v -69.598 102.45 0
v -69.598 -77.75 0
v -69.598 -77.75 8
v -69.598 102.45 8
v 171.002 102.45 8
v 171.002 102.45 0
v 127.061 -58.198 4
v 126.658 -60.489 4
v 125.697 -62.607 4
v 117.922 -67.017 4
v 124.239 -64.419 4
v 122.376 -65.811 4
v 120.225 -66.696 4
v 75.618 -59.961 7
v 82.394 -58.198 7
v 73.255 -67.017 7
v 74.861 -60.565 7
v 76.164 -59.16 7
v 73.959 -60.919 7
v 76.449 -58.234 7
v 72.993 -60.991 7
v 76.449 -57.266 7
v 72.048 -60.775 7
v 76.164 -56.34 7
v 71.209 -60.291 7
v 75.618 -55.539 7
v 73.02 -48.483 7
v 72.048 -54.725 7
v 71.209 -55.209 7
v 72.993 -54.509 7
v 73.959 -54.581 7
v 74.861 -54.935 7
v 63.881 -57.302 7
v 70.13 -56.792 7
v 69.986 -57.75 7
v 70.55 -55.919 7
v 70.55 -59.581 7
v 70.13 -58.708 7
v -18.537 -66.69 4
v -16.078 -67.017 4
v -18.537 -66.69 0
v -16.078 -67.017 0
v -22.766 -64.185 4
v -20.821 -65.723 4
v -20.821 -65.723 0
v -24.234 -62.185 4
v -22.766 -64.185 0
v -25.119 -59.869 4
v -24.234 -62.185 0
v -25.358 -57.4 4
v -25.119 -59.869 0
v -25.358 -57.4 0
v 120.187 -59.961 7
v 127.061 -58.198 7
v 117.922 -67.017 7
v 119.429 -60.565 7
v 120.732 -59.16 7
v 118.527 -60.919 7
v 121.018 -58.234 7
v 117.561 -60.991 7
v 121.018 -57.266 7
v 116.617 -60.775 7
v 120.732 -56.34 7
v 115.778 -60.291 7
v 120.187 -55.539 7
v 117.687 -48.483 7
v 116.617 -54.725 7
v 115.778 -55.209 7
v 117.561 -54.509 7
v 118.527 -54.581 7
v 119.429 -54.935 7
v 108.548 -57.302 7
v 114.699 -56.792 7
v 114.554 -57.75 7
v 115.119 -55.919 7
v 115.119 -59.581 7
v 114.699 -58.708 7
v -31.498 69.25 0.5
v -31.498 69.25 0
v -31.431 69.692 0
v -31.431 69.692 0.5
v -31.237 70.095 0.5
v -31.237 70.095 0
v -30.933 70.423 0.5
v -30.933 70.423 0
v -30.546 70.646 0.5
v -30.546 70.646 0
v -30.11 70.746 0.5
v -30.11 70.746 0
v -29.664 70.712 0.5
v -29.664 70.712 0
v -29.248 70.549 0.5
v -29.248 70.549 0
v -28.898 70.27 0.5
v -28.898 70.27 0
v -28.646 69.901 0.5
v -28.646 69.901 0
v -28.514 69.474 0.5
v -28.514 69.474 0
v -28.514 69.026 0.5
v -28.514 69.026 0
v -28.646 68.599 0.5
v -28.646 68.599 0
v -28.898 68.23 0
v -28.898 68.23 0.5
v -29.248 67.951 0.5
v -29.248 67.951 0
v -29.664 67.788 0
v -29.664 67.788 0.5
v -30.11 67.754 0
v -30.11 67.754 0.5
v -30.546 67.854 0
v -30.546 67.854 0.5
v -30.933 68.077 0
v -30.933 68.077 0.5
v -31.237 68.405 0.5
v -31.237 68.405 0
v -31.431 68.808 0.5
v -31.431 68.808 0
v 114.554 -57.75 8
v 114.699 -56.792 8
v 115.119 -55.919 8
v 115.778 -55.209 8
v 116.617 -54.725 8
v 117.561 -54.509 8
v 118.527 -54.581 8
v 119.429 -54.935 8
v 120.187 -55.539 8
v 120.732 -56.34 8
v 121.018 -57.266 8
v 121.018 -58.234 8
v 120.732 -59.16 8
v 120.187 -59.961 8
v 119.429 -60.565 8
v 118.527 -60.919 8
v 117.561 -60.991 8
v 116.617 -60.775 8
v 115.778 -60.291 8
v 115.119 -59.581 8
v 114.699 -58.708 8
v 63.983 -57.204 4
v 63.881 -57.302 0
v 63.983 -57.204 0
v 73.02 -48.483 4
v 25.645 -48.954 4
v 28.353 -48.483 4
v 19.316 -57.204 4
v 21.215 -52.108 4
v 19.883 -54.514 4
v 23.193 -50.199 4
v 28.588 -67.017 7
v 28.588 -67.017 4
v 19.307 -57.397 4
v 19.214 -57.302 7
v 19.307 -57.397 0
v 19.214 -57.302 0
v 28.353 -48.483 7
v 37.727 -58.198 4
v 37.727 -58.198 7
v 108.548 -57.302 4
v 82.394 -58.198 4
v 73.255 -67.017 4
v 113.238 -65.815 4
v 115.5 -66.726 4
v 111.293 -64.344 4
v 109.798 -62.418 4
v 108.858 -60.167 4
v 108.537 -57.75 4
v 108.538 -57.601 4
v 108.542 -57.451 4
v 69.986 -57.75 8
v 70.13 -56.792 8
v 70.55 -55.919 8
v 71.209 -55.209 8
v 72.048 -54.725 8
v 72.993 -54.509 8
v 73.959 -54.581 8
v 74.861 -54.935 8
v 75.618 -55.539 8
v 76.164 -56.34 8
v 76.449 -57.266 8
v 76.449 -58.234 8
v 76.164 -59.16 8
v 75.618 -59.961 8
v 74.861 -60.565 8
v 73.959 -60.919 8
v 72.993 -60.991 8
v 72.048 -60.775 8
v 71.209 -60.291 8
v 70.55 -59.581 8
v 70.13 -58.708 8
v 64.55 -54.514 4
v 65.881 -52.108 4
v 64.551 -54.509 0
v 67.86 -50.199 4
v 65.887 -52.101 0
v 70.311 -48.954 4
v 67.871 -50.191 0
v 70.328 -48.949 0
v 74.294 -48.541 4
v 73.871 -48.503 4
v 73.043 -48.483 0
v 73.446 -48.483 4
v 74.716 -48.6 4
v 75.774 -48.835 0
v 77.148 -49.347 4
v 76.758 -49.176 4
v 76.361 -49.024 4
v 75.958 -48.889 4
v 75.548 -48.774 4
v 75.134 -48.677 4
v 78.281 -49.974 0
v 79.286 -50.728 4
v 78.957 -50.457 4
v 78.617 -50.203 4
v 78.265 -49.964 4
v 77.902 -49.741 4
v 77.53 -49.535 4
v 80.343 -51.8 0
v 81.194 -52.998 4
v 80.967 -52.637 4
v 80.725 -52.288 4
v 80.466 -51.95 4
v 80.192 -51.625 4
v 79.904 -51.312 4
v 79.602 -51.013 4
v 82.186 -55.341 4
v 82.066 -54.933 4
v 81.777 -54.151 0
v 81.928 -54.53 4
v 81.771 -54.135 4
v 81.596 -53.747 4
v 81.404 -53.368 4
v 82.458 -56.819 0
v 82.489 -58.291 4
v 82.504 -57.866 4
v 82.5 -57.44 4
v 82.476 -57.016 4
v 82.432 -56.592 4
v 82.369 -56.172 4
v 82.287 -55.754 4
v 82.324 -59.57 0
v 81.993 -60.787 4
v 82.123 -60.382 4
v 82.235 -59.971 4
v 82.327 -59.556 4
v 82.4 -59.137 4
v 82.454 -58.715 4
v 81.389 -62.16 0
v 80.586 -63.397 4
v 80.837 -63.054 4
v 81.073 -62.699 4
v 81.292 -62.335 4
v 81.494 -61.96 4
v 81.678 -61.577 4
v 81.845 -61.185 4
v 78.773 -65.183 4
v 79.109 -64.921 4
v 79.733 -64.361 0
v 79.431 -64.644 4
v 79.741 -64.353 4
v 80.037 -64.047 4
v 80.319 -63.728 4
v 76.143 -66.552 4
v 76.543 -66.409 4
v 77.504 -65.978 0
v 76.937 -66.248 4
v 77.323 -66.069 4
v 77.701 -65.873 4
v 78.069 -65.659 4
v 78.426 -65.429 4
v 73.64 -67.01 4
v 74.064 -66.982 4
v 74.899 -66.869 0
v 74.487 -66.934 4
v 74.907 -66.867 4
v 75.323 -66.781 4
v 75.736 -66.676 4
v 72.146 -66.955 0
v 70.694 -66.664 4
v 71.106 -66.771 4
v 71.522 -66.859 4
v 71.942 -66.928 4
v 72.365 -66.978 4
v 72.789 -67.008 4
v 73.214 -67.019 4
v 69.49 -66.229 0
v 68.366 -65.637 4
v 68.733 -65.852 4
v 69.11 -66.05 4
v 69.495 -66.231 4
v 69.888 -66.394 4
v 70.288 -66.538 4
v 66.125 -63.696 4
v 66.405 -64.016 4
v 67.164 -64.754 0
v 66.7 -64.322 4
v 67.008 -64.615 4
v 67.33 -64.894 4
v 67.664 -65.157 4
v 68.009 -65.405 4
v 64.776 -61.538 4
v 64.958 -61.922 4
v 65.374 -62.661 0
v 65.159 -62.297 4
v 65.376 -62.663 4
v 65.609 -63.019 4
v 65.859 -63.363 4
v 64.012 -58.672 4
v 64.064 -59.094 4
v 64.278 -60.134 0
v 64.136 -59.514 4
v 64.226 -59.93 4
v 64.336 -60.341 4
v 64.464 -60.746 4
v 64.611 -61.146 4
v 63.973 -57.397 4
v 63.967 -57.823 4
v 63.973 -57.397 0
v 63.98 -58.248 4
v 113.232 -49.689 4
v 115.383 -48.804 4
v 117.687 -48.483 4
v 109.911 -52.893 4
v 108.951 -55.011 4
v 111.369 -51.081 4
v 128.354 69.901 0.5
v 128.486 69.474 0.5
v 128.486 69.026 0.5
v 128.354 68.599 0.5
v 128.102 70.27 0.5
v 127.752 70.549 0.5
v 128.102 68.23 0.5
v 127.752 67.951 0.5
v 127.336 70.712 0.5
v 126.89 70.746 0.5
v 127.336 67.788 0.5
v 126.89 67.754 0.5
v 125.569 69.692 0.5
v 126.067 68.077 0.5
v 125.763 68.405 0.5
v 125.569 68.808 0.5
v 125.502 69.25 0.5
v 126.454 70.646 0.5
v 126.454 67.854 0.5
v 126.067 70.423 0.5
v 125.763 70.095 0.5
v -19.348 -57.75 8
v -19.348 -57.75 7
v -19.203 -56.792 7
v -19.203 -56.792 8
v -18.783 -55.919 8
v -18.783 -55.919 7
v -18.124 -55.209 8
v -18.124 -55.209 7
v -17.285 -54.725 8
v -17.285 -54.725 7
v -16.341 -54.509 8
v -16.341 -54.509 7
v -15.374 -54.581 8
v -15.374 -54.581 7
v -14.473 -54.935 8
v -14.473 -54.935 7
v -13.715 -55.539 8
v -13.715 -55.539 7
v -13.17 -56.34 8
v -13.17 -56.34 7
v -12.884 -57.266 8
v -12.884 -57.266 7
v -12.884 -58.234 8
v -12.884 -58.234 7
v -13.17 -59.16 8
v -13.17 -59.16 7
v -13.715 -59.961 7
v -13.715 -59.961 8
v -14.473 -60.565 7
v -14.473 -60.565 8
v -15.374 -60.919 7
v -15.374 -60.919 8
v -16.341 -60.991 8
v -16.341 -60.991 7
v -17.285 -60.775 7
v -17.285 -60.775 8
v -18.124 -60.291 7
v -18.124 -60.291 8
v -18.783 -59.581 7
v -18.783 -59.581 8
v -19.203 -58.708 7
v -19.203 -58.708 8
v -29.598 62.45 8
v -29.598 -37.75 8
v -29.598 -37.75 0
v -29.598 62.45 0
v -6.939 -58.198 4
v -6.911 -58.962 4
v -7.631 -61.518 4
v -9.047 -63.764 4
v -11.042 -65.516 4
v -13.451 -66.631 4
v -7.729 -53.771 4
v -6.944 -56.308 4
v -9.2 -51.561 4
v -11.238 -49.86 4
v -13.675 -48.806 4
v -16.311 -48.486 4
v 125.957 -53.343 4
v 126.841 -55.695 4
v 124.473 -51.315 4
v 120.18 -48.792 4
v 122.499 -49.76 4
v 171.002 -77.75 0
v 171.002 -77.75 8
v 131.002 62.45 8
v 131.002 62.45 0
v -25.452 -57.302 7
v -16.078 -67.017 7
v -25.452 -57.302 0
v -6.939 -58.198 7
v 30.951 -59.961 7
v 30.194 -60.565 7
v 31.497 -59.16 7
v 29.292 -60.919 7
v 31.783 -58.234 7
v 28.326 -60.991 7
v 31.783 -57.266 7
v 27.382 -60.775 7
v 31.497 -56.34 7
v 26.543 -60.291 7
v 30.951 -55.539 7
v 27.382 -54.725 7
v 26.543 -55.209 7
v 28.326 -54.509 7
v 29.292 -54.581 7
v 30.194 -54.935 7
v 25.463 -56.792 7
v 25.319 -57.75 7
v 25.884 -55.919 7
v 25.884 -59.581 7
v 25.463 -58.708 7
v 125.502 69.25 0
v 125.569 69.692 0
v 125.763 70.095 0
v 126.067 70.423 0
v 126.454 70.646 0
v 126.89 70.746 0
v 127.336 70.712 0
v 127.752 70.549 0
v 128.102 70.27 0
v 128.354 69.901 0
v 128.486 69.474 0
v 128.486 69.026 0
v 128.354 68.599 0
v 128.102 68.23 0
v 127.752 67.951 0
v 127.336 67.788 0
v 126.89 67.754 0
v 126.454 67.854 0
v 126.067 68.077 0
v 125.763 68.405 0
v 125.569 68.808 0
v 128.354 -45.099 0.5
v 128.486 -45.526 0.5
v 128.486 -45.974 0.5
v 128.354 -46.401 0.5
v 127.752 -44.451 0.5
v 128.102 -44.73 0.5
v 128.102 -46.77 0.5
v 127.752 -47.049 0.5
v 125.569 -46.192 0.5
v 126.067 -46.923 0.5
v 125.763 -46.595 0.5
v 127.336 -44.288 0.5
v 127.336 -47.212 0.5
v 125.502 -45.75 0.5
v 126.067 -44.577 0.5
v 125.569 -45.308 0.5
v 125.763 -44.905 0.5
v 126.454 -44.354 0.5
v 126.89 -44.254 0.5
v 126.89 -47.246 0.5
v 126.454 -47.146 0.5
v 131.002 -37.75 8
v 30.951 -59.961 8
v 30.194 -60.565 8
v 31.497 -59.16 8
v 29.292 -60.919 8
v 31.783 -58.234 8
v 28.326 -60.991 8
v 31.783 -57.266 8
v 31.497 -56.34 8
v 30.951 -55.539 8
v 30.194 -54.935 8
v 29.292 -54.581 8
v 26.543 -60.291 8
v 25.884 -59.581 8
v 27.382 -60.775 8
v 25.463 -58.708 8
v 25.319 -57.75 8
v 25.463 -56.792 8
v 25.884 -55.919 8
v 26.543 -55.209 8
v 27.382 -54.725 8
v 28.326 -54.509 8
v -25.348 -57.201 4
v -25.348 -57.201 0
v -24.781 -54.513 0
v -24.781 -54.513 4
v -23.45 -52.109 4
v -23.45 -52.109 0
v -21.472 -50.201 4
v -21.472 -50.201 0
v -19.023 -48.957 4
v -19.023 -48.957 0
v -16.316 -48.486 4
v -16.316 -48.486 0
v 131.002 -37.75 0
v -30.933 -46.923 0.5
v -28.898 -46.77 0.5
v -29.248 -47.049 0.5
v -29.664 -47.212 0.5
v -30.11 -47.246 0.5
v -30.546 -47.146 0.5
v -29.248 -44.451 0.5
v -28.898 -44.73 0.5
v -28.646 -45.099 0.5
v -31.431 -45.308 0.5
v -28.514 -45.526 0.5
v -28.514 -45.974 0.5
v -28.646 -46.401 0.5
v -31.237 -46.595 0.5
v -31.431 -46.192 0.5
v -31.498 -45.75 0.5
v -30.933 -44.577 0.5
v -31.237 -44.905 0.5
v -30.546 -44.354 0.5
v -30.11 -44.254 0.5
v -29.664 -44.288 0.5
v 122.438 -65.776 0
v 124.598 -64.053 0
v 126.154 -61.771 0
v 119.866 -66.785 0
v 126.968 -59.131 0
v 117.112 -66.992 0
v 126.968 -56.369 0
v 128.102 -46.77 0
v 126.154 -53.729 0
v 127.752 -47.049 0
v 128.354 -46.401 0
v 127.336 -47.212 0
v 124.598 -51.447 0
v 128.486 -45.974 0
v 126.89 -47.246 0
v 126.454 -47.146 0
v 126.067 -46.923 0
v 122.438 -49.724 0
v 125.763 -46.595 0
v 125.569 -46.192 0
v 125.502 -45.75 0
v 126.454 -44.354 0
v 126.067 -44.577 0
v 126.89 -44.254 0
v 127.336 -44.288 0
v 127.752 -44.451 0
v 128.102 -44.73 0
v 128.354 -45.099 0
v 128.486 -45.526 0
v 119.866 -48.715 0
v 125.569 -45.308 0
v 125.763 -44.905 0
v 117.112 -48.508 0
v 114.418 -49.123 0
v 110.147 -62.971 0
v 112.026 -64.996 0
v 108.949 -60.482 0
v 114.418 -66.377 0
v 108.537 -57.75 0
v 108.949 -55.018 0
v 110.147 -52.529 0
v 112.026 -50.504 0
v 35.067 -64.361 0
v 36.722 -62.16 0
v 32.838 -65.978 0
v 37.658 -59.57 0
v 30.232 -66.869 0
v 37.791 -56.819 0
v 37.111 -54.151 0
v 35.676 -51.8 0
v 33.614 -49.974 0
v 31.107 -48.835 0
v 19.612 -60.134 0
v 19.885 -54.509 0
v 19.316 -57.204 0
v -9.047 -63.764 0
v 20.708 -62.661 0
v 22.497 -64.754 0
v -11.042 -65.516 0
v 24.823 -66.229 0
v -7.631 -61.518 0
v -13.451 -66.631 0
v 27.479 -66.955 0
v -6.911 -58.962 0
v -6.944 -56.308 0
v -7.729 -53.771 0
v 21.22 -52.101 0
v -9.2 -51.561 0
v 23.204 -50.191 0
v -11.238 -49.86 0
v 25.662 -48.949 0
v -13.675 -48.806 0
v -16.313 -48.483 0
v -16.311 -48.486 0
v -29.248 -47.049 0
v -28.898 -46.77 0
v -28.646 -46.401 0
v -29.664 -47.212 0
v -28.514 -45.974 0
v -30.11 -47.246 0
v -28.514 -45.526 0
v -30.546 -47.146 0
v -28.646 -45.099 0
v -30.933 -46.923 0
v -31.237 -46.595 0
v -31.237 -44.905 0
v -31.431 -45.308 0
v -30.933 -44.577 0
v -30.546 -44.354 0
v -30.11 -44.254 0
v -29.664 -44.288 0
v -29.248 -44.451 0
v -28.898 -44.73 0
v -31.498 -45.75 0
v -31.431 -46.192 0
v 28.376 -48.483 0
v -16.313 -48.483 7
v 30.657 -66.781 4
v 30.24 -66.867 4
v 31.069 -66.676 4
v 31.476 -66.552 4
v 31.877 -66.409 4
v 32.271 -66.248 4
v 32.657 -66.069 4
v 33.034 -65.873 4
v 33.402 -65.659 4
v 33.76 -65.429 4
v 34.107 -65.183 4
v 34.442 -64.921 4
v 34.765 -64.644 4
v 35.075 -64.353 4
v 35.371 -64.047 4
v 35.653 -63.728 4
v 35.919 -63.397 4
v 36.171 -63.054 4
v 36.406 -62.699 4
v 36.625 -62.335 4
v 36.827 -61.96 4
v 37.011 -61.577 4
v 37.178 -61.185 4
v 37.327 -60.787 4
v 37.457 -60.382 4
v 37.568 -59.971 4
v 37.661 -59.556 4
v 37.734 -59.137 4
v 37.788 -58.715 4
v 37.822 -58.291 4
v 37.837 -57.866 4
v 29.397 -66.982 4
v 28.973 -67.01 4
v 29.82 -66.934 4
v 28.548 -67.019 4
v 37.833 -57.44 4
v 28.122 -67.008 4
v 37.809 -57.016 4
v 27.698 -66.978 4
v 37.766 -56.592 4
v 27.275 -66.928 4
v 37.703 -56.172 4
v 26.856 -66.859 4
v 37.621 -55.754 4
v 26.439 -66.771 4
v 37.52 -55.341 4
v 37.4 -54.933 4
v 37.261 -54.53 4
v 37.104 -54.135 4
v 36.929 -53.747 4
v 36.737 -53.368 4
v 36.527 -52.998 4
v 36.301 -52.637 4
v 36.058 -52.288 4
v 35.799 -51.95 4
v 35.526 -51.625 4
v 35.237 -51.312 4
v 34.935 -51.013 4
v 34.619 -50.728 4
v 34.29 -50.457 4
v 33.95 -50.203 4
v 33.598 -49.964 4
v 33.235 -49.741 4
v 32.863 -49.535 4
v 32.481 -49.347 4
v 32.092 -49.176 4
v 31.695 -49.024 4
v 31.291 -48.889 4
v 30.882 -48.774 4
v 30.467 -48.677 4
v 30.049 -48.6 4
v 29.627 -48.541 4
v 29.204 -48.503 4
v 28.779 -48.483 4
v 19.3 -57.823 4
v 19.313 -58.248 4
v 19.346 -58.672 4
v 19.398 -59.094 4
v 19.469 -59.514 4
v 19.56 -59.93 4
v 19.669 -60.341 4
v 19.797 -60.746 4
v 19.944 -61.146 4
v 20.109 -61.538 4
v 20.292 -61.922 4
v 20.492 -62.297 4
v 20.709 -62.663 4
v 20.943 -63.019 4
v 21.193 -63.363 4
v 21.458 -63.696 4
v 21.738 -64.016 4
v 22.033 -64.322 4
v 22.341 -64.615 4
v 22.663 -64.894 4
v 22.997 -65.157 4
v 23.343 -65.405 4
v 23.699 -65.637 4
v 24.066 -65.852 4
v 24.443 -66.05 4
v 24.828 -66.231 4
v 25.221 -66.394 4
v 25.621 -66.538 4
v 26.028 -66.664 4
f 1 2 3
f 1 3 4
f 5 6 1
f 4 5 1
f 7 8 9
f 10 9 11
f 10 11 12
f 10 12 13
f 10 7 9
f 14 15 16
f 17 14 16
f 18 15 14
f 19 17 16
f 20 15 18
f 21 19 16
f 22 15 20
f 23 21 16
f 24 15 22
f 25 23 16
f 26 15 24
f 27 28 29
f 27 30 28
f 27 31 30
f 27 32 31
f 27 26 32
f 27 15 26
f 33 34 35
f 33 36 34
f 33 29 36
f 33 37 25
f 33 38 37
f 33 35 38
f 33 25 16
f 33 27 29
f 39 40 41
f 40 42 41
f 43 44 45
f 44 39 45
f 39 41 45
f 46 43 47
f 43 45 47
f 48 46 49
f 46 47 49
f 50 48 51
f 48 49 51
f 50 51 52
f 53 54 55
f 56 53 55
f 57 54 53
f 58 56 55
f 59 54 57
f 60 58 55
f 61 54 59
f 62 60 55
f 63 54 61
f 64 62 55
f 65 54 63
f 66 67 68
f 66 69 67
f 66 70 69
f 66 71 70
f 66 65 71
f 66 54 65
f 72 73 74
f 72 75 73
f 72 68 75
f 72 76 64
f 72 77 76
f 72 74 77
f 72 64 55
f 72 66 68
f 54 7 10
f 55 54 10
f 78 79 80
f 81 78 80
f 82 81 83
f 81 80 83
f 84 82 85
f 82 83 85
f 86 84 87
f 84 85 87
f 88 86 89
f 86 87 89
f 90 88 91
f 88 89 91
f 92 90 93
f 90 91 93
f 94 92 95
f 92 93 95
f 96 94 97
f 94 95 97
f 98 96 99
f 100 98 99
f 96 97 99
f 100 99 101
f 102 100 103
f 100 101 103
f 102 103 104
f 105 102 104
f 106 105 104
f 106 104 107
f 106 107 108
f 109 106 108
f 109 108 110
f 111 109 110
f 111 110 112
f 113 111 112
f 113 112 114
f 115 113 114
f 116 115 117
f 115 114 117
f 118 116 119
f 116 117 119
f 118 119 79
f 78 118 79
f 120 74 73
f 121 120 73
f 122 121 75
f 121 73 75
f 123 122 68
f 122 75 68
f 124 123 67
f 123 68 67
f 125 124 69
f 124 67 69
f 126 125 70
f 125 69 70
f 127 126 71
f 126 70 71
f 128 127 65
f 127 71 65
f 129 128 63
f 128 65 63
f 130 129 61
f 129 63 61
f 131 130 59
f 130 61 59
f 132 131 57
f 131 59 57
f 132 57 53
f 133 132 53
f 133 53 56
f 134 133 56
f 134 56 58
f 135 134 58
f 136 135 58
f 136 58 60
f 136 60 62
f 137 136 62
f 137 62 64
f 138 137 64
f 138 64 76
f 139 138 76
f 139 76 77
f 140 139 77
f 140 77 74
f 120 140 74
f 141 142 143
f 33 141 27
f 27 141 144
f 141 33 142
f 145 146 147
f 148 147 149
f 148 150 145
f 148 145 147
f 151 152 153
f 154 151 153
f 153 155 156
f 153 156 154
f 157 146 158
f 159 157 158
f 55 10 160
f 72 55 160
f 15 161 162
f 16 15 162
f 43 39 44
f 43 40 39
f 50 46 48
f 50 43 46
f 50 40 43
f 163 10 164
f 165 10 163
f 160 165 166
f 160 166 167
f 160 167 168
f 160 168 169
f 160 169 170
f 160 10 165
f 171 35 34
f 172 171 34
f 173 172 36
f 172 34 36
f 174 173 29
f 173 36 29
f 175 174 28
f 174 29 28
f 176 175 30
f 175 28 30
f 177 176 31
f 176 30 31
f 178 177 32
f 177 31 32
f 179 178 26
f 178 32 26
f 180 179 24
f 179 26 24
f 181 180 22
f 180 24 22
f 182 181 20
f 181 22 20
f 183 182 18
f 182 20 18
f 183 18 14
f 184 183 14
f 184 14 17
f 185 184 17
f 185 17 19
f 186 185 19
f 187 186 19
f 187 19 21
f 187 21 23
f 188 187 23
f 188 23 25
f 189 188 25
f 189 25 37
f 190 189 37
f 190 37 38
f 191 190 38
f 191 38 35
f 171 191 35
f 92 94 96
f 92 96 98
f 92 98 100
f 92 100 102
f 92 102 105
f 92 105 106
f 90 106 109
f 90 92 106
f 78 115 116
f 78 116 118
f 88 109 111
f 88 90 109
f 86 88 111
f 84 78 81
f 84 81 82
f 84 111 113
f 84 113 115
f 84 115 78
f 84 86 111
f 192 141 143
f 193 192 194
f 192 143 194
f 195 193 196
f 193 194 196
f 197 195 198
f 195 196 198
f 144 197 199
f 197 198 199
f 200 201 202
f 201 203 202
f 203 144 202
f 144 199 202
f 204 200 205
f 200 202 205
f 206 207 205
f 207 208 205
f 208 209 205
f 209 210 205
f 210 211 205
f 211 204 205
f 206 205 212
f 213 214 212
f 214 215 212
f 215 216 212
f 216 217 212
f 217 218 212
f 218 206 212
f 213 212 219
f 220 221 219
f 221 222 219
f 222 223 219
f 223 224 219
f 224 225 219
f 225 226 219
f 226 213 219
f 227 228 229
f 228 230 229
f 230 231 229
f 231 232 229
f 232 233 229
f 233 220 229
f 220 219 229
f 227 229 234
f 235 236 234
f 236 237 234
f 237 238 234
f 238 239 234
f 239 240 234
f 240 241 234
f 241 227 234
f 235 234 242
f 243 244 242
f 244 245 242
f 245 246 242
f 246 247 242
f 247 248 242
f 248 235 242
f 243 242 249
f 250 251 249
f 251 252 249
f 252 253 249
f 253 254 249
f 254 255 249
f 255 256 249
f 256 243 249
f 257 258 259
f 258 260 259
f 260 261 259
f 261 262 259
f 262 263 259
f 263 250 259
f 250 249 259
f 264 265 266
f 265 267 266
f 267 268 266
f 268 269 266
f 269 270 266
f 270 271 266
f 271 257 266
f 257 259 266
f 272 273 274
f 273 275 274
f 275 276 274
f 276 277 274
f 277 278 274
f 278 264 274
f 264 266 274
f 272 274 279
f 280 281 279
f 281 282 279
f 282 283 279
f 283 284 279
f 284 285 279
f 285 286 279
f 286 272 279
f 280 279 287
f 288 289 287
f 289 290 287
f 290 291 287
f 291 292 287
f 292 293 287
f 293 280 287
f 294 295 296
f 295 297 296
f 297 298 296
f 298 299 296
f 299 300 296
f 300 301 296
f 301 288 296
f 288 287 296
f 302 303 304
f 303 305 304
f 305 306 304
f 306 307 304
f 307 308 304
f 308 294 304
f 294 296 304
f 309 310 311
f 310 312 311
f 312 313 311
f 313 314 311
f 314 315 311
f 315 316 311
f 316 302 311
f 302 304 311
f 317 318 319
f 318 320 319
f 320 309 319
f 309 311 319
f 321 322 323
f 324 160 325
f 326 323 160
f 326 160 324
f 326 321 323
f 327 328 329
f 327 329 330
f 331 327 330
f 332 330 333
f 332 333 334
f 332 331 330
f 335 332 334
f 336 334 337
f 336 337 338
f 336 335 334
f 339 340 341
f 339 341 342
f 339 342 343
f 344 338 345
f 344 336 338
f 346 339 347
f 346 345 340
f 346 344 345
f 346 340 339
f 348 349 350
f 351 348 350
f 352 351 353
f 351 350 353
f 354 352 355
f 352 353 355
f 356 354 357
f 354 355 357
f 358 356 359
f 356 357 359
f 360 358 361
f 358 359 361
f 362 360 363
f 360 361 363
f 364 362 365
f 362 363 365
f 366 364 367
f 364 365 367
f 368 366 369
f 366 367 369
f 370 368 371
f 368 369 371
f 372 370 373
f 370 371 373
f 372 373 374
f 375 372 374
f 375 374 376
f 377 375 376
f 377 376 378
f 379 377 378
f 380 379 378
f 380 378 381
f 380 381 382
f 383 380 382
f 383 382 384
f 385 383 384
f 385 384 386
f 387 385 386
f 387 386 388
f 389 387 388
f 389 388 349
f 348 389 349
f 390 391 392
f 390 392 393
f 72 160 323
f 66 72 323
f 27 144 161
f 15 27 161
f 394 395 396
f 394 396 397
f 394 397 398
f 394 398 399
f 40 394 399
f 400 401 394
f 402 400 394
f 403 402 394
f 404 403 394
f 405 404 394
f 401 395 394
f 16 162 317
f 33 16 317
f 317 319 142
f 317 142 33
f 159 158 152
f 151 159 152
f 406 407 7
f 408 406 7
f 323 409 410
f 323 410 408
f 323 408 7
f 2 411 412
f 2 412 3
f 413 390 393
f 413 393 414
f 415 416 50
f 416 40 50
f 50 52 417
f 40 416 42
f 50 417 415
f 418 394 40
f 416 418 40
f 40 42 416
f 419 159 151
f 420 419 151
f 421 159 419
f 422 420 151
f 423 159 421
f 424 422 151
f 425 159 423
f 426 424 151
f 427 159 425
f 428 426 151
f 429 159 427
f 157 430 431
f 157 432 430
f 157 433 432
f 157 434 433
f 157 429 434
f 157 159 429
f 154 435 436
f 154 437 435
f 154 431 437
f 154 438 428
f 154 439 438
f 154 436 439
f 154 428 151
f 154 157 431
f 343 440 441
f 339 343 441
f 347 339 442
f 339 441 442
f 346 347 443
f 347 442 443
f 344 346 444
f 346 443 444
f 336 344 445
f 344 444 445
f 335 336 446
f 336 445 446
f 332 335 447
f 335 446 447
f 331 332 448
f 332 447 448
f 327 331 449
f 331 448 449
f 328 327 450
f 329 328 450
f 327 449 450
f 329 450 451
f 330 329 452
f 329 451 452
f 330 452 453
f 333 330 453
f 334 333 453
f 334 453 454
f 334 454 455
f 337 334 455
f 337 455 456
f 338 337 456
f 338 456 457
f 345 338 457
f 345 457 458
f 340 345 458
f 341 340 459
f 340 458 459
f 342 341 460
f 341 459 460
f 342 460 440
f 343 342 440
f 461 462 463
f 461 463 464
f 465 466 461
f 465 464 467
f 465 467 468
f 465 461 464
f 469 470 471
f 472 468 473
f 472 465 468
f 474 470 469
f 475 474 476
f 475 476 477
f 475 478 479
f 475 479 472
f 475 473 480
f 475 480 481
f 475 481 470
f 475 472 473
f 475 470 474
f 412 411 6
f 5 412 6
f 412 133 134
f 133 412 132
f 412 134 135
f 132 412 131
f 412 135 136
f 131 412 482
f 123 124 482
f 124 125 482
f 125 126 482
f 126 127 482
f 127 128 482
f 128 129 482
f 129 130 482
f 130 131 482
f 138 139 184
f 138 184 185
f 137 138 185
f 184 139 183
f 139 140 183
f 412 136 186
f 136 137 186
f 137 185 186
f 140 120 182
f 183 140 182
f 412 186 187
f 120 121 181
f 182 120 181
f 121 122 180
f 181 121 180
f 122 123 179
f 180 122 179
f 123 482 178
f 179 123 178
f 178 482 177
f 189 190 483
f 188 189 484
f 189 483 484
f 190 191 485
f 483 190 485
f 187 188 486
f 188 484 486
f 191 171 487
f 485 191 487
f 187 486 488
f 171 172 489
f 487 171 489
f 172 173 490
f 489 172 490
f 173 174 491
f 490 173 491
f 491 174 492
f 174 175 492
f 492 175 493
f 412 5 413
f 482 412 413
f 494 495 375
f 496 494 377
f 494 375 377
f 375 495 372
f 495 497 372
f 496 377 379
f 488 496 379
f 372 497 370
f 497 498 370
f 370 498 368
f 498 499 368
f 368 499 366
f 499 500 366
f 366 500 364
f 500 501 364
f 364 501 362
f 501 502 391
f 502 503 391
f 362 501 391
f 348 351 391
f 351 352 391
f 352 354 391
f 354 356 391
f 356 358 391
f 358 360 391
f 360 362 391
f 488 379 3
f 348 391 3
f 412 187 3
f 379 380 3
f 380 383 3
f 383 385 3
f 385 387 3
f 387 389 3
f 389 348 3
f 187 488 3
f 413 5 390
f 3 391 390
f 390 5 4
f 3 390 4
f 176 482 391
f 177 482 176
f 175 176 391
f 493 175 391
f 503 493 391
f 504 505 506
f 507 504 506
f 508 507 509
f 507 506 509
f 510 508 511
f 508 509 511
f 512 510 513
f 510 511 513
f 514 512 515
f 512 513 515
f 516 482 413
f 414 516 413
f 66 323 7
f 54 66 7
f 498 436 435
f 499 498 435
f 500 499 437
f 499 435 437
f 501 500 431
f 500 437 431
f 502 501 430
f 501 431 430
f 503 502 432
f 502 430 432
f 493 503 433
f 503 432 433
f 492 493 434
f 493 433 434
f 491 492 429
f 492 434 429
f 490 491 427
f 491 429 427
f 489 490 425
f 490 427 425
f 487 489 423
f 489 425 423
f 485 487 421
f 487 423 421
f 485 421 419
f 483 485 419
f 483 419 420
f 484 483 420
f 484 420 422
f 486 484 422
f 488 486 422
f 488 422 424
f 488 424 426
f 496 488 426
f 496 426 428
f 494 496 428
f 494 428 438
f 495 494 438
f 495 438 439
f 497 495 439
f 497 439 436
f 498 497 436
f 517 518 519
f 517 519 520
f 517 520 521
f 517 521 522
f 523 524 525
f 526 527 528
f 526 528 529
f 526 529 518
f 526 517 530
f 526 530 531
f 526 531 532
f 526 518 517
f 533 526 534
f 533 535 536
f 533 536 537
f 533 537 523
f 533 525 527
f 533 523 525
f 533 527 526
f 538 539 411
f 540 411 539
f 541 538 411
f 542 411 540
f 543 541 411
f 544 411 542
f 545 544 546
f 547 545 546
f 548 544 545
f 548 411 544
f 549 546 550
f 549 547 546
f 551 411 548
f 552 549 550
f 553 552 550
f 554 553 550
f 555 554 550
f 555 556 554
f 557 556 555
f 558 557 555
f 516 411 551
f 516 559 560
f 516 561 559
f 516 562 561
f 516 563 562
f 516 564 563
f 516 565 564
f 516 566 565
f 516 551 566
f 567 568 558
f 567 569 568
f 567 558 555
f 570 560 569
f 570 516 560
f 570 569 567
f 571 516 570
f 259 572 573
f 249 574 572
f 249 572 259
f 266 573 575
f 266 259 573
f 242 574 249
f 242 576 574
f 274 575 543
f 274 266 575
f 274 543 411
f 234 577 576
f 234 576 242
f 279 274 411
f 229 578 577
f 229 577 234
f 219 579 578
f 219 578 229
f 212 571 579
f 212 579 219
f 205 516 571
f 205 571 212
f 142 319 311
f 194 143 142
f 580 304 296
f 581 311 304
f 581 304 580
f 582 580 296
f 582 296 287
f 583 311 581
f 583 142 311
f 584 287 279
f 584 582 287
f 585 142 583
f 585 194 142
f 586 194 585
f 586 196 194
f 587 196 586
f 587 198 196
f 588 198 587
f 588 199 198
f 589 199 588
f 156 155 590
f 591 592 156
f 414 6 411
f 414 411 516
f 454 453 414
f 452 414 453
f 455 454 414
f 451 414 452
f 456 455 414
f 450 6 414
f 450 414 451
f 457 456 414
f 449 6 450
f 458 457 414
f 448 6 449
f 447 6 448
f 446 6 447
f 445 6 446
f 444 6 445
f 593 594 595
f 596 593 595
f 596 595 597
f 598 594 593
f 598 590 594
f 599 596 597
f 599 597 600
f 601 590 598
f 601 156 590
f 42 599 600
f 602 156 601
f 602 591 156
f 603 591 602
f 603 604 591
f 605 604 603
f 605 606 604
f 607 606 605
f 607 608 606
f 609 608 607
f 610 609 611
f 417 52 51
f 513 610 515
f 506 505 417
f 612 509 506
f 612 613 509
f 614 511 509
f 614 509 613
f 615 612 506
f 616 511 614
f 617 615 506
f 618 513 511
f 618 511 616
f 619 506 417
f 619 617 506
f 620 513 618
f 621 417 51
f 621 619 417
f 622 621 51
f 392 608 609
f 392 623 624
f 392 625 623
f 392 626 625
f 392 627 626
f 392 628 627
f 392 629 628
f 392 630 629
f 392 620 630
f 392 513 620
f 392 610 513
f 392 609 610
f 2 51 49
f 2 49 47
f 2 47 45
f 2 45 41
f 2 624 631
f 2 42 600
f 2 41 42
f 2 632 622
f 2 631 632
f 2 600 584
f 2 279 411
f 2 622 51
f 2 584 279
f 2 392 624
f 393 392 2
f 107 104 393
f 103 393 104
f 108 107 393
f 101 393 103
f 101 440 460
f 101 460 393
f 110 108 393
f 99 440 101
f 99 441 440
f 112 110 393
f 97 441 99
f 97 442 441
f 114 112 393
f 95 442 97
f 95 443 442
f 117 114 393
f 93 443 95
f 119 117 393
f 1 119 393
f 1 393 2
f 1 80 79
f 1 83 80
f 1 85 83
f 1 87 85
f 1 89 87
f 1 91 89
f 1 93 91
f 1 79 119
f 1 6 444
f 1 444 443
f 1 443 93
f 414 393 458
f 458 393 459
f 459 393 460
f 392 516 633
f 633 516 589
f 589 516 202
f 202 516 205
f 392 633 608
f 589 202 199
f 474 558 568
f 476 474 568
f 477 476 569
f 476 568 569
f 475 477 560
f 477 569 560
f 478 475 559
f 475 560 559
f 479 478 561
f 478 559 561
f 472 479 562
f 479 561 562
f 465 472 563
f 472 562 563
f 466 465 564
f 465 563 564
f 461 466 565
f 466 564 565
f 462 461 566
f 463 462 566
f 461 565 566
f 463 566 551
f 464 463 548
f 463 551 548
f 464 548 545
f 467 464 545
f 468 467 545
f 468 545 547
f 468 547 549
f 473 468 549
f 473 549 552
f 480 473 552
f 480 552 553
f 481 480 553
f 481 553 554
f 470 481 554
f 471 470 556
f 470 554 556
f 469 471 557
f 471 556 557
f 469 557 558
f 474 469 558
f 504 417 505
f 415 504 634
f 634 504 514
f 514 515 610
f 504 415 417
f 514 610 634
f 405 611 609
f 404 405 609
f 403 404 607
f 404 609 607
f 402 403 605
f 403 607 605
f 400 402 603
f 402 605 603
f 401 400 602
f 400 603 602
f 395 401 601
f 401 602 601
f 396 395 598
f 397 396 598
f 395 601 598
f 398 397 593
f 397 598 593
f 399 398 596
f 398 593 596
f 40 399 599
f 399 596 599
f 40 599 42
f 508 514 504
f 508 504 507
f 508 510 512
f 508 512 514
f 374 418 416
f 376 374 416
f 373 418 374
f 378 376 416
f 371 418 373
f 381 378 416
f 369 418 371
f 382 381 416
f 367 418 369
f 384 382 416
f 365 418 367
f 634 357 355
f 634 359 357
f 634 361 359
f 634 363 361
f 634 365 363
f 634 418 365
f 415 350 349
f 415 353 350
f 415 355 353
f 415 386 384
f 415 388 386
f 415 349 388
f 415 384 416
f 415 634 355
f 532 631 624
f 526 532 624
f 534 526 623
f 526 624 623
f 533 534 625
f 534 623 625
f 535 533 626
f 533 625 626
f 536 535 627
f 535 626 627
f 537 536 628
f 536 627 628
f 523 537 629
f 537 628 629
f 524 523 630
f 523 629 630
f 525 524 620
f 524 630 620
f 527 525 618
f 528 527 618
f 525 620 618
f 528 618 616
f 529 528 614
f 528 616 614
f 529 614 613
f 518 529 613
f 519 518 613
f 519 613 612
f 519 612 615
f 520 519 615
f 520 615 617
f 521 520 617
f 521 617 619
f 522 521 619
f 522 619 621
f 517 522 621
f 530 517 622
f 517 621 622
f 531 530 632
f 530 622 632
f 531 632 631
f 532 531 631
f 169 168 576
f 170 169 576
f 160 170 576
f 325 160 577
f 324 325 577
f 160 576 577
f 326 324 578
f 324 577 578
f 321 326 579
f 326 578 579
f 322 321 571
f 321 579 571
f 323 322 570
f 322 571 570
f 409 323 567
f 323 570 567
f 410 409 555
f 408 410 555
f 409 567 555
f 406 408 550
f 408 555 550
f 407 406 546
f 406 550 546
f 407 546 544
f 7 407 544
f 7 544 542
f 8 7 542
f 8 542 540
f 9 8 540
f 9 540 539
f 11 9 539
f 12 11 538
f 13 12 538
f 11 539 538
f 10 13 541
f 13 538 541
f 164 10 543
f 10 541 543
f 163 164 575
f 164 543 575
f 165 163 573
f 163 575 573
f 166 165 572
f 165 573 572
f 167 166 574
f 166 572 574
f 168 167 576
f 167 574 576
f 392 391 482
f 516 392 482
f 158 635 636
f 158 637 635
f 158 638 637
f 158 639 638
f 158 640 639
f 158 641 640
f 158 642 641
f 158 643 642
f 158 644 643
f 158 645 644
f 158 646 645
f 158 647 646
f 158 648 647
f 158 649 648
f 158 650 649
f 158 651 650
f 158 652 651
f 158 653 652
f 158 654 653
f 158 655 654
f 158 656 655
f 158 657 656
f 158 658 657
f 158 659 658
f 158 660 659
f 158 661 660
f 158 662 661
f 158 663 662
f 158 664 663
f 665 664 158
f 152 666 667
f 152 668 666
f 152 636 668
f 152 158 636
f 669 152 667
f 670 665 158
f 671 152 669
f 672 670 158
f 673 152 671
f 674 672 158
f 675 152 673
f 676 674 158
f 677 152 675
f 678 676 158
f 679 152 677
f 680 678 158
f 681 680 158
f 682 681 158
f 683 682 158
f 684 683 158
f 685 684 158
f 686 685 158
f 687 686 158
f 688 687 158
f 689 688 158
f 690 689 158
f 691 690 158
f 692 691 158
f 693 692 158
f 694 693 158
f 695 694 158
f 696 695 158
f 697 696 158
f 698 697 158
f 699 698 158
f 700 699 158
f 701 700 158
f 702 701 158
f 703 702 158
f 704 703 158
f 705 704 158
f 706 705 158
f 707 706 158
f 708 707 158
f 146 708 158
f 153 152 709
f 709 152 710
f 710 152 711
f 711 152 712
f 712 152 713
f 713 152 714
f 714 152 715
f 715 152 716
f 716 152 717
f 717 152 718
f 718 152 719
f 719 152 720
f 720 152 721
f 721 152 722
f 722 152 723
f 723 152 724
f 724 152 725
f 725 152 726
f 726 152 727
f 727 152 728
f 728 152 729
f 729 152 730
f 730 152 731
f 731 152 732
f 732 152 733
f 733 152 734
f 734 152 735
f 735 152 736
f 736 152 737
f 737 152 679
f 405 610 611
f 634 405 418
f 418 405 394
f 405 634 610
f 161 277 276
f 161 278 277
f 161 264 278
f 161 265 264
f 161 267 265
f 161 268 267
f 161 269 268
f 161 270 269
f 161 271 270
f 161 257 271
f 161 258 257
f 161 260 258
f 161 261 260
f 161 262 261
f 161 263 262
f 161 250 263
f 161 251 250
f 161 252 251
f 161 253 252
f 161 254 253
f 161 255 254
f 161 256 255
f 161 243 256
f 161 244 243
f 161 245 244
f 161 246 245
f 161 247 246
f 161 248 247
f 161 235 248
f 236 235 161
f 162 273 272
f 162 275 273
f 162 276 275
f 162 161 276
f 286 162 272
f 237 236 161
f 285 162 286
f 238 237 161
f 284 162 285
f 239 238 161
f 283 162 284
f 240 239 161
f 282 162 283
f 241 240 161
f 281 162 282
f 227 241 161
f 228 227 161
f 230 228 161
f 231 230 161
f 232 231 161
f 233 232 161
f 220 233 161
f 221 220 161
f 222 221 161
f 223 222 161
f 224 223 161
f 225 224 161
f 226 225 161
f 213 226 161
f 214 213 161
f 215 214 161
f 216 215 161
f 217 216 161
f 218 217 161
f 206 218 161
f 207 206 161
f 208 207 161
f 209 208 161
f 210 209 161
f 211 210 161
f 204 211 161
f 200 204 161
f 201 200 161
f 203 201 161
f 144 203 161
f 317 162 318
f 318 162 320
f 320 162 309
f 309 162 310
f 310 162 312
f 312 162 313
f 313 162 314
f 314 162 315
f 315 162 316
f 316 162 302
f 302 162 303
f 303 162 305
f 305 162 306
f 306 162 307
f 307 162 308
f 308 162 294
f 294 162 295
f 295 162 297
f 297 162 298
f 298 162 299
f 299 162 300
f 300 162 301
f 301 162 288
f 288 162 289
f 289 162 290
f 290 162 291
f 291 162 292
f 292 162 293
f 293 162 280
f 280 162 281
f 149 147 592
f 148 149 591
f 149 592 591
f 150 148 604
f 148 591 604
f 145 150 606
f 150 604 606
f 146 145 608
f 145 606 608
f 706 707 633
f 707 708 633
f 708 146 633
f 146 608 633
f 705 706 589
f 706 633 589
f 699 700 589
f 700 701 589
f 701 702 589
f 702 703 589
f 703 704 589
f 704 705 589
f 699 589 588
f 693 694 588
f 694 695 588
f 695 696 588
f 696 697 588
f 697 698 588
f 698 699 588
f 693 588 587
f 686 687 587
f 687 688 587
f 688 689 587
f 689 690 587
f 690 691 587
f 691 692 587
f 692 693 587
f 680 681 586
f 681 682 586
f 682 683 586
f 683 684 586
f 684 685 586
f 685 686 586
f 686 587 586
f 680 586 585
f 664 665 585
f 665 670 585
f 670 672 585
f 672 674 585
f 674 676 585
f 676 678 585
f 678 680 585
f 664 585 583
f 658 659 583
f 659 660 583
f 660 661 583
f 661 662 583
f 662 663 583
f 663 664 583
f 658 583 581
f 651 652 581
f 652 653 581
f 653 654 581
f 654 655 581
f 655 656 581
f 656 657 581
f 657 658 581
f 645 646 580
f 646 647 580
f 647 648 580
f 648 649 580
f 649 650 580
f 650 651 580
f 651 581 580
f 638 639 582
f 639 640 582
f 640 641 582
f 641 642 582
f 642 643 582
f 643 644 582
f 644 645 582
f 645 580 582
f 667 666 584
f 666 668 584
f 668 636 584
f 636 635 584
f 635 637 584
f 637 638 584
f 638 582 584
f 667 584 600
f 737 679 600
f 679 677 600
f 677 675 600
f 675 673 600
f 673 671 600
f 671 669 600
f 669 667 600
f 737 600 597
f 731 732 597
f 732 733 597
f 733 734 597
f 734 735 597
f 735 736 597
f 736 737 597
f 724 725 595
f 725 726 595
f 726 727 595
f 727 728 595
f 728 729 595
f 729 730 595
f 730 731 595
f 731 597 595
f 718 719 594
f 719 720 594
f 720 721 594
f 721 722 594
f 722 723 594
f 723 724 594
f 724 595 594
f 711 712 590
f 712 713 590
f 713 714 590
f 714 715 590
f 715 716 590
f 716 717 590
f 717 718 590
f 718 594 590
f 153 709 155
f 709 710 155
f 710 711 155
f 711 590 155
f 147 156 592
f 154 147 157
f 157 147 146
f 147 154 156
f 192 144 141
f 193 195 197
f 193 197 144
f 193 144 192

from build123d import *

# Parameters (mm, degrees)
SKETCH1_W                      = 240.6
SKETCH1_H                      = 180.2
BOSS_EXTRUDE1_DEPTH            = 8
SKETCH2_W                      = 160.6
SKETCH2_H                      = 100.2
CUT_EXTRUDE1_DEPTH             = 200.503872501
CUT_EXTRUDE2_DEPTH             = 7
CUT_EXTRUDE3_DEPTH             = 7
CUT_EXTRUDE4_DEPTH             = 7
CUT_EXTRUDE5_DEPTH             = 7
F_6_5_6_5_DIAMETER_HOLE1_D     = 6.5
F_6_5_6_5_DIAMETER_HOLE1_DEPTH = 8
SKETCH9_R                      = 9.267416037
SKETCH9_R_2                    = 9.269178346
SKETCH9_R_3                    = 9.266671768
CUT_EXTRUDE7_DEPTH             = 4
SKETCH10_R                     = 1.5
CUT_EXTRUDE8_DEPTH             = 0.5


with BuildPart() as part:
    # Sketch1 → Boss-Extrude1 (new body)
    with BuildSketch(Plane(origin=(0, 0, 0), x_dir=(-1, 0, 0), z_dir=(0, 0, -1))):
        with Locations((-50.702318109, 12.34999924)):
            Rectangle(SKETCH1_W, SKETCH1_H)
    extrude(amount=-BOSS_EXTRUDE1_DEPTH)

    # Sketch2 → Cut-Extrude1 (cut, through all)
    with BuildSketch(Plane.XY.offset(8)):
        with Locations((50.702318109, 12.34999924)):
            Rectangle(SKETCH2_W, SKETCH2_H)
    extrude(amount=-CUT_EXTRUDE1_DEPTH, mode=Mode.SUBTRACT)

    # Sketch3 → Cut-Extrude2 (cut)
    with BuildSketch(Plane(origin=(0, 0, 0), x_dir=(-1, 0, 0), z_dir=(0, 0, -1))):
        Polygon((-117.686768689, -48.483328992), (-127.060792146, -58.198146757), (-117.921667286, -67.016672528), (-108.547643828, -57.301854763), align=None)
    extrude(amount=-CUT_EXTRUDE2_DEPTH, mode=Mode.SUBTRACT)

    # Sketch4 → Cut-Extrude3 (cut)
    with BuildSketch(Plane(origin=(0, 0, 0), x_dir=(-1, 0, 0), z_dir=(0, 0, -1))):
        Polygon((6.939207854, -58.198146757), (16.078332714, -67.016672528), (25.452356172, -57.301854763), (16.313231311, -48.483328992), align=None)
    extrude(amount=-CUT_EXTRUDE3_DEPTH, mode=Mode.SUBTRACT)

    # Sketch5 → Cut-Extrude4 (cut)
    with BuildSketch(Plane(origin=(0, 0, 0), x_dir=(-1, 0, 0), z_dir=(0, 0, -1))):
        Polygon((-37.727458813, -58.198146757), (-28.588333952, -67.016672528), (-19.214310494, -57.301854763), (-28.353435355, -48.483328992), align=None)
    extrude(amount=-CUT_EXTRUDE4_DEPTH, mode=Mode.SUBTRACT)

    # Sketch6 → Cut-Extrude5 (cut)
    with BuildSketch(Plane(origin=(0, 0, 0), x_dir=(-1, 0, 0), z_dir=(0, 0, -1))):
        Polygon((-82.39412548, -58.198146757), (-73.255000619, -67.016672528), (-63.880977161, -57.301854763), (-73.020102022, -48.483328992), align=None)
    extrude(amount=-CUT_EXTRUDE5_DEPTH, mode=Mode.SUBTRACT)

    # Ø6.5 (6.5) Diameter Hole1
    with Locations(Plane.XY.offset(8)):
        with Locations((117.804217987, -57.75000076), (-16.097681891, -57.75000076), (28.568984776, -57.75000076), (73.235651442, -57.75000076)):
            Hole(F_6_5_6_5_DIAMETER_HOLE1_D / 2, depth=F_6_5_6_5_DIAMETER_HOLE1_DEPTH)

    # Sketch9 → Cut-Extrude7 (cut)
    with BuildSketch(Plane(origin=(0, 0, 0), x_dir=(-1, 0, 0), z_dir=(0, 0, -1))):
        with Locations((-117.804217987, -57.75000076)):
            Circle(SKETCH9_R)
        with Locations((-73.235651442, -57.75000076)):
            Circle(SKETCH9_R_2)
        with Locations((-28.568984776, -57.75000076)):
            Circle(SKETCH9_R_2)
        with Locations((16.097681891, -57.75000076)):
            Circle(SKETCH9_R_3)
    extrude(amount=-CUT_EXTRUDE7_DEPTH, mode=Mode.SUBTRACT)

    # Sketch10 → Cut-Extrude8 (cut)
    with BuildSketch(Plane(origin=(0, 0, 0), x_dir=(-1, 0, 0), z_dir=(0, 0, -1))):
        with Locations((-127.002318109, 69.24999924)):
            Circle(SKETCH10_R)
        with Locations((29.997681891, 69.24999924)):
            Circle(SKETCH10_R)
        with Locations((29.997681891, -45.75000076)):
            Circle(SKETCH10_R)
        with Locations((-127.002318109, -45.75000076)):
            Circle(SKETCH10_R)
    extrude(amount=-CUT_EXTRUDE8_DEPTH, mode=Mode.SUBTRACT)


solid = part.part
